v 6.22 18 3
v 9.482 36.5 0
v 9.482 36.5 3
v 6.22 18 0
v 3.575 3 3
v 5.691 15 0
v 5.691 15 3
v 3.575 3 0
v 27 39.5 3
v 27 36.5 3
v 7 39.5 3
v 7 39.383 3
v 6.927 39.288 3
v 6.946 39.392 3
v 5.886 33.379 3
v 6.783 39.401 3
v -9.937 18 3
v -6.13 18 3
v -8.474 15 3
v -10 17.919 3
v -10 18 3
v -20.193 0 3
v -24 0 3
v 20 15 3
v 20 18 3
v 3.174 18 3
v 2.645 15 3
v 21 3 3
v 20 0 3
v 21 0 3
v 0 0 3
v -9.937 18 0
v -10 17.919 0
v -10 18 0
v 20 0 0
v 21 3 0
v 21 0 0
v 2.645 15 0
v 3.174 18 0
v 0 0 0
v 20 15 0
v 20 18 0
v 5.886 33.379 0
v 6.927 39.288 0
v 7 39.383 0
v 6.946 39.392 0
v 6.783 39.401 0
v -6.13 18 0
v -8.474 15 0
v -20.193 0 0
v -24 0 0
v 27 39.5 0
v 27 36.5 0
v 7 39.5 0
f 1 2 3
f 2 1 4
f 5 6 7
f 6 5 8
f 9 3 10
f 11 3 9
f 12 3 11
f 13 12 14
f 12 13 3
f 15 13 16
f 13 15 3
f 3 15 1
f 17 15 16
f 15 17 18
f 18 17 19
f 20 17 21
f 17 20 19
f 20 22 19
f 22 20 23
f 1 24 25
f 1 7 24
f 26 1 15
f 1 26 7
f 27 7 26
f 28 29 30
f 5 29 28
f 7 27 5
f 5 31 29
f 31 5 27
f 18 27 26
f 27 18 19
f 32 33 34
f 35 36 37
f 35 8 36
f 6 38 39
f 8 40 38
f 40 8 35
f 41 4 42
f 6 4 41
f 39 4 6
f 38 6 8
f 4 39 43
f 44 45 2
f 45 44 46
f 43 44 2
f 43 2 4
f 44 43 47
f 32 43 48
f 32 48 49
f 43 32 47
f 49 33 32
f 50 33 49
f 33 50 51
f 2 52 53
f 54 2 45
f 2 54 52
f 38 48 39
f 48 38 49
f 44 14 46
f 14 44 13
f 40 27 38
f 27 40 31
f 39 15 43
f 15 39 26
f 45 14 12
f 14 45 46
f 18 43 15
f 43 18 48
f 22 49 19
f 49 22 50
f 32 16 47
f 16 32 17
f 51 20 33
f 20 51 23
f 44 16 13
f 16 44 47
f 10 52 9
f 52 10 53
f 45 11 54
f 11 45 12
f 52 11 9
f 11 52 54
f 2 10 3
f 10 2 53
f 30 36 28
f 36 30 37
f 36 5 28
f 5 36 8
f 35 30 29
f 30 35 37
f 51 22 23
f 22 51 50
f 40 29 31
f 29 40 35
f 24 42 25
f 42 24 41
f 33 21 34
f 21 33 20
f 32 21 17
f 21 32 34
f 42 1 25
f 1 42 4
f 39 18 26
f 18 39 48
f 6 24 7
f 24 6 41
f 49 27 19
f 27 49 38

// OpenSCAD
difference(){
union(){
 rotate([0,0,-10]) cube([3,40,3]);
 translate([-24,0,0]) rotate([0,0,-38]) cube([3,50,3]);
 translate([7,36.5,0]) cube([20,3,3]);
 translate([1,0,0]) cube([20,3,3]);
 translate([-10,15,0]) cube([30,3,3]);
}
 translate([-80,-3,-1]) cube([100,3,5]);
}
